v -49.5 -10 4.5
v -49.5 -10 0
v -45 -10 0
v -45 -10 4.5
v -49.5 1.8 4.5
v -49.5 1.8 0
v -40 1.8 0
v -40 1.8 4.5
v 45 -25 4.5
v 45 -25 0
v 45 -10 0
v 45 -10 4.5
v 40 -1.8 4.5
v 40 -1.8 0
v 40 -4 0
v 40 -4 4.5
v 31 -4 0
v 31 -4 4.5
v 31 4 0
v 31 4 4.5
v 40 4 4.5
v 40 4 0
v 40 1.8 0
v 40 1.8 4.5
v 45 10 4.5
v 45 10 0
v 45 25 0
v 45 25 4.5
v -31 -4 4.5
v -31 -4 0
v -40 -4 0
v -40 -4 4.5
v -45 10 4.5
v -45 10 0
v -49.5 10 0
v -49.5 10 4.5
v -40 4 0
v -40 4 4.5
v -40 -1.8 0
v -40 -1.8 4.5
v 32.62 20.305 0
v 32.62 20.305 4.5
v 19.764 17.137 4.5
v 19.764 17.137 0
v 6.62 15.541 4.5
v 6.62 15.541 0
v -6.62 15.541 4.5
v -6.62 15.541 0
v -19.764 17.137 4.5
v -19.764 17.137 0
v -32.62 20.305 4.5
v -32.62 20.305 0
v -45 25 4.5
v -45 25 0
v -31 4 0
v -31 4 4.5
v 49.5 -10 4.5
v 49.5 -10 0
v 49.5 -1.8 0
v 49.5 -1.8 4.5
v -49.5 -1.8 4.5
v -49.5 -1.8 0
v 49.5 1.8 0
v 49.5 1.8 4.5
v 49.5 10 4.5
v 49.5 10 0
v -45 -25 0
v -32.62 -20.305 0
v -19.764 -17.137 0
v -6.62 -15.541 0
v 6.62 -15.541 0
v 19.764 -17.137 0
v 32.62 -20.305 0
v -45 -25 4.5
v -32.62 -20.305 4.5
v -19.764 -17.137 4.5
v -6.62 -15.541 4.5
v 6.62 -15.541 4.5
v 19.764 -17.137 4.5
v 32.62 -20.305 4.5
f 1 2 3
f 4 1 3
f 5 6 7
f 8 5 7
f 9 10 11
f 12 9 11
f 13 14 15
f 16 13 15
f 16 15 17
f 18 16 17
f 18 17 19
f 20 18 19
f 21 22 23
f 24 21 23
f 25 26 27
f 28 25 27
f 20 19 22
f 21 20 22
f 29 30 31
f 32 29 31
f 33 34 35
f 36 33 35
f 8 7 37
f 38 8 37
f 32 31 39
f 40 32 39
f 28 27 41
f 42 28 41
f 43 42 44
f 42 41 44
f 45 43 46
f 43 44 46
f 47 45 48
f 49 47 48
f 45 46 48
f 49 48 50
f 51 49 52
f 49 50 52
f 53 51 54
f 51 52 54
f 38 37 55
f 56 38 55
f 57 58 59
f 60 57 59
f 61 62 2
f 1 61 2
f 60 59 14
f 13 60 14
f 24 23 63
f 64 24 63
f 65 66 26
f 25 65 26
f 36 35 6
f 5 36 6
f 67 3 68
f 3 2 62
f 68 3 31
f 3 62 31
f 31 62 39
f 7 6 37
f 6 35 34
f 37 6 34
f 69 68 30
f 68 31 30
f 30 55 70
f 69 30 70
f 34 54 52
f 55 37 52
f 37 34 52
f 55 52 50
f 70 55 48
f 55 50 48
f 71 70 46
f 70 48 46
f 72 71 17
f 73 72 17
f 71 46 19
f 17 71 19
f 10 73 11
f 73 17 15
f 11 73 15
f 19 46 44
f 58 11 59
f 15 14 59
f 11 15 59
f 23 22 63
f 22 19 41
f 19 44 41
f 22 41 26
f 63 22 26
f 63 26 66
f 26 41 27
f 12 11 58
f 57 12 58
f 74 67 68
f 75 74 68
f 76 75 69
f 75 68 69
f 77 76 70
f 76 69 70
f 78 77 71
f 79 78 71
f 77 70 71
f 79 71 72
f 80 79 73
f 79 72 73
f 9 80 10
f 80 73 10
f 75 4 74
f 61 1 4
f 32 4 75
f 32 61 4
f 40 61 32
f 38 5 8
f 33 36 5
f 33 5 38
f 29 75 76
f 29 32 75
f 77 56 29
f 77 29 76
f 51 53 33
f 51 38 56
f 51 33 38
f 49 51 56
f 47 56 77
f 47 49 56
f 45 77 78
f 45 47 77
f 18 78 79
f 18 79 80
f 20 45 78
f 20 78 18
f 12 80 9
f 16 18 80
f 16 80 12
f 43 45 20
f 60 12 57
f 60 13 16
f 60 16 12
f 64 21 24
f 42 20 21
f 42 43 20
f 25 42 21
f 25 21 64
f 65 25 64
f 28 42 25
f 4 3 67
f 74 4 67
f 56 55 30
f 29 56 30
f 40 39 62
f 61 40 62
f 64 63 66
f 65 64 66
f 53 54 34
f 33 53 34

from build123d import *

# Parameters (mm, degrees)
BOSS_EXTRUDE1_DEPTH = 4.5


with BuildPart() as part:
    # Sketch1 → Boss-Extrude1 (new body)
    with BuildSketch(Plane.XY):
        with BuildLine():
            Line((-49.5, -1.8), (-49.5, -10))
            Line((-49.5, -10), (-45, -10))
            Line((-45, -10), (-45, -25))
            ThreePointArc((-45, -25), (0, -15.341439003), (45, -25))
            Line((45, -25), (45, -10))
            Line((45, -10), (49.5, -10))
            Line((49.5, -10), (49.5, -1.8))
            Line((49.5, -1.8), (40, -1.8))
            Line((40, -1.8), (40, -4))
            Line((40, -4), (31, -4))
            Line((31, -4), (31, 4))
            Line((31, 4), (40, 4))
            Line((40, 4), (40, 1.8))
            Line((40, 1.8), (49.5, 1.8))
            Line((49.5, 1.8), (49.5, 10))
            Line((49.5, 10), (45, 10))
            Line((45, 10), (45, 25))
            ThreePointArc((45, 25), (0, 15.341439003), (-45, 25))
            Line((-45, 25), (-45, 10))
            Line((-45, 10), (-49.5, 10))
            Line((-49.5, 10), (-49.5, 1.8))
            Line((-49.5, 1.8), (-40, 1.8))
            Line((-40, 1.8), (-40, 4))
            Line((-40, 4), (-31, 4))
            Line((-31, 4), (-31, -4))
            Line((-31, -4), (-40, -4))
            Line((-40, -4), (-40, -1.8))
            Line((-40, -1.8), (-49.5, -1.8))
        make_face()
    extrude(amount=BOSS_EXTRUDE1_DEPTH)


solid = part.part
